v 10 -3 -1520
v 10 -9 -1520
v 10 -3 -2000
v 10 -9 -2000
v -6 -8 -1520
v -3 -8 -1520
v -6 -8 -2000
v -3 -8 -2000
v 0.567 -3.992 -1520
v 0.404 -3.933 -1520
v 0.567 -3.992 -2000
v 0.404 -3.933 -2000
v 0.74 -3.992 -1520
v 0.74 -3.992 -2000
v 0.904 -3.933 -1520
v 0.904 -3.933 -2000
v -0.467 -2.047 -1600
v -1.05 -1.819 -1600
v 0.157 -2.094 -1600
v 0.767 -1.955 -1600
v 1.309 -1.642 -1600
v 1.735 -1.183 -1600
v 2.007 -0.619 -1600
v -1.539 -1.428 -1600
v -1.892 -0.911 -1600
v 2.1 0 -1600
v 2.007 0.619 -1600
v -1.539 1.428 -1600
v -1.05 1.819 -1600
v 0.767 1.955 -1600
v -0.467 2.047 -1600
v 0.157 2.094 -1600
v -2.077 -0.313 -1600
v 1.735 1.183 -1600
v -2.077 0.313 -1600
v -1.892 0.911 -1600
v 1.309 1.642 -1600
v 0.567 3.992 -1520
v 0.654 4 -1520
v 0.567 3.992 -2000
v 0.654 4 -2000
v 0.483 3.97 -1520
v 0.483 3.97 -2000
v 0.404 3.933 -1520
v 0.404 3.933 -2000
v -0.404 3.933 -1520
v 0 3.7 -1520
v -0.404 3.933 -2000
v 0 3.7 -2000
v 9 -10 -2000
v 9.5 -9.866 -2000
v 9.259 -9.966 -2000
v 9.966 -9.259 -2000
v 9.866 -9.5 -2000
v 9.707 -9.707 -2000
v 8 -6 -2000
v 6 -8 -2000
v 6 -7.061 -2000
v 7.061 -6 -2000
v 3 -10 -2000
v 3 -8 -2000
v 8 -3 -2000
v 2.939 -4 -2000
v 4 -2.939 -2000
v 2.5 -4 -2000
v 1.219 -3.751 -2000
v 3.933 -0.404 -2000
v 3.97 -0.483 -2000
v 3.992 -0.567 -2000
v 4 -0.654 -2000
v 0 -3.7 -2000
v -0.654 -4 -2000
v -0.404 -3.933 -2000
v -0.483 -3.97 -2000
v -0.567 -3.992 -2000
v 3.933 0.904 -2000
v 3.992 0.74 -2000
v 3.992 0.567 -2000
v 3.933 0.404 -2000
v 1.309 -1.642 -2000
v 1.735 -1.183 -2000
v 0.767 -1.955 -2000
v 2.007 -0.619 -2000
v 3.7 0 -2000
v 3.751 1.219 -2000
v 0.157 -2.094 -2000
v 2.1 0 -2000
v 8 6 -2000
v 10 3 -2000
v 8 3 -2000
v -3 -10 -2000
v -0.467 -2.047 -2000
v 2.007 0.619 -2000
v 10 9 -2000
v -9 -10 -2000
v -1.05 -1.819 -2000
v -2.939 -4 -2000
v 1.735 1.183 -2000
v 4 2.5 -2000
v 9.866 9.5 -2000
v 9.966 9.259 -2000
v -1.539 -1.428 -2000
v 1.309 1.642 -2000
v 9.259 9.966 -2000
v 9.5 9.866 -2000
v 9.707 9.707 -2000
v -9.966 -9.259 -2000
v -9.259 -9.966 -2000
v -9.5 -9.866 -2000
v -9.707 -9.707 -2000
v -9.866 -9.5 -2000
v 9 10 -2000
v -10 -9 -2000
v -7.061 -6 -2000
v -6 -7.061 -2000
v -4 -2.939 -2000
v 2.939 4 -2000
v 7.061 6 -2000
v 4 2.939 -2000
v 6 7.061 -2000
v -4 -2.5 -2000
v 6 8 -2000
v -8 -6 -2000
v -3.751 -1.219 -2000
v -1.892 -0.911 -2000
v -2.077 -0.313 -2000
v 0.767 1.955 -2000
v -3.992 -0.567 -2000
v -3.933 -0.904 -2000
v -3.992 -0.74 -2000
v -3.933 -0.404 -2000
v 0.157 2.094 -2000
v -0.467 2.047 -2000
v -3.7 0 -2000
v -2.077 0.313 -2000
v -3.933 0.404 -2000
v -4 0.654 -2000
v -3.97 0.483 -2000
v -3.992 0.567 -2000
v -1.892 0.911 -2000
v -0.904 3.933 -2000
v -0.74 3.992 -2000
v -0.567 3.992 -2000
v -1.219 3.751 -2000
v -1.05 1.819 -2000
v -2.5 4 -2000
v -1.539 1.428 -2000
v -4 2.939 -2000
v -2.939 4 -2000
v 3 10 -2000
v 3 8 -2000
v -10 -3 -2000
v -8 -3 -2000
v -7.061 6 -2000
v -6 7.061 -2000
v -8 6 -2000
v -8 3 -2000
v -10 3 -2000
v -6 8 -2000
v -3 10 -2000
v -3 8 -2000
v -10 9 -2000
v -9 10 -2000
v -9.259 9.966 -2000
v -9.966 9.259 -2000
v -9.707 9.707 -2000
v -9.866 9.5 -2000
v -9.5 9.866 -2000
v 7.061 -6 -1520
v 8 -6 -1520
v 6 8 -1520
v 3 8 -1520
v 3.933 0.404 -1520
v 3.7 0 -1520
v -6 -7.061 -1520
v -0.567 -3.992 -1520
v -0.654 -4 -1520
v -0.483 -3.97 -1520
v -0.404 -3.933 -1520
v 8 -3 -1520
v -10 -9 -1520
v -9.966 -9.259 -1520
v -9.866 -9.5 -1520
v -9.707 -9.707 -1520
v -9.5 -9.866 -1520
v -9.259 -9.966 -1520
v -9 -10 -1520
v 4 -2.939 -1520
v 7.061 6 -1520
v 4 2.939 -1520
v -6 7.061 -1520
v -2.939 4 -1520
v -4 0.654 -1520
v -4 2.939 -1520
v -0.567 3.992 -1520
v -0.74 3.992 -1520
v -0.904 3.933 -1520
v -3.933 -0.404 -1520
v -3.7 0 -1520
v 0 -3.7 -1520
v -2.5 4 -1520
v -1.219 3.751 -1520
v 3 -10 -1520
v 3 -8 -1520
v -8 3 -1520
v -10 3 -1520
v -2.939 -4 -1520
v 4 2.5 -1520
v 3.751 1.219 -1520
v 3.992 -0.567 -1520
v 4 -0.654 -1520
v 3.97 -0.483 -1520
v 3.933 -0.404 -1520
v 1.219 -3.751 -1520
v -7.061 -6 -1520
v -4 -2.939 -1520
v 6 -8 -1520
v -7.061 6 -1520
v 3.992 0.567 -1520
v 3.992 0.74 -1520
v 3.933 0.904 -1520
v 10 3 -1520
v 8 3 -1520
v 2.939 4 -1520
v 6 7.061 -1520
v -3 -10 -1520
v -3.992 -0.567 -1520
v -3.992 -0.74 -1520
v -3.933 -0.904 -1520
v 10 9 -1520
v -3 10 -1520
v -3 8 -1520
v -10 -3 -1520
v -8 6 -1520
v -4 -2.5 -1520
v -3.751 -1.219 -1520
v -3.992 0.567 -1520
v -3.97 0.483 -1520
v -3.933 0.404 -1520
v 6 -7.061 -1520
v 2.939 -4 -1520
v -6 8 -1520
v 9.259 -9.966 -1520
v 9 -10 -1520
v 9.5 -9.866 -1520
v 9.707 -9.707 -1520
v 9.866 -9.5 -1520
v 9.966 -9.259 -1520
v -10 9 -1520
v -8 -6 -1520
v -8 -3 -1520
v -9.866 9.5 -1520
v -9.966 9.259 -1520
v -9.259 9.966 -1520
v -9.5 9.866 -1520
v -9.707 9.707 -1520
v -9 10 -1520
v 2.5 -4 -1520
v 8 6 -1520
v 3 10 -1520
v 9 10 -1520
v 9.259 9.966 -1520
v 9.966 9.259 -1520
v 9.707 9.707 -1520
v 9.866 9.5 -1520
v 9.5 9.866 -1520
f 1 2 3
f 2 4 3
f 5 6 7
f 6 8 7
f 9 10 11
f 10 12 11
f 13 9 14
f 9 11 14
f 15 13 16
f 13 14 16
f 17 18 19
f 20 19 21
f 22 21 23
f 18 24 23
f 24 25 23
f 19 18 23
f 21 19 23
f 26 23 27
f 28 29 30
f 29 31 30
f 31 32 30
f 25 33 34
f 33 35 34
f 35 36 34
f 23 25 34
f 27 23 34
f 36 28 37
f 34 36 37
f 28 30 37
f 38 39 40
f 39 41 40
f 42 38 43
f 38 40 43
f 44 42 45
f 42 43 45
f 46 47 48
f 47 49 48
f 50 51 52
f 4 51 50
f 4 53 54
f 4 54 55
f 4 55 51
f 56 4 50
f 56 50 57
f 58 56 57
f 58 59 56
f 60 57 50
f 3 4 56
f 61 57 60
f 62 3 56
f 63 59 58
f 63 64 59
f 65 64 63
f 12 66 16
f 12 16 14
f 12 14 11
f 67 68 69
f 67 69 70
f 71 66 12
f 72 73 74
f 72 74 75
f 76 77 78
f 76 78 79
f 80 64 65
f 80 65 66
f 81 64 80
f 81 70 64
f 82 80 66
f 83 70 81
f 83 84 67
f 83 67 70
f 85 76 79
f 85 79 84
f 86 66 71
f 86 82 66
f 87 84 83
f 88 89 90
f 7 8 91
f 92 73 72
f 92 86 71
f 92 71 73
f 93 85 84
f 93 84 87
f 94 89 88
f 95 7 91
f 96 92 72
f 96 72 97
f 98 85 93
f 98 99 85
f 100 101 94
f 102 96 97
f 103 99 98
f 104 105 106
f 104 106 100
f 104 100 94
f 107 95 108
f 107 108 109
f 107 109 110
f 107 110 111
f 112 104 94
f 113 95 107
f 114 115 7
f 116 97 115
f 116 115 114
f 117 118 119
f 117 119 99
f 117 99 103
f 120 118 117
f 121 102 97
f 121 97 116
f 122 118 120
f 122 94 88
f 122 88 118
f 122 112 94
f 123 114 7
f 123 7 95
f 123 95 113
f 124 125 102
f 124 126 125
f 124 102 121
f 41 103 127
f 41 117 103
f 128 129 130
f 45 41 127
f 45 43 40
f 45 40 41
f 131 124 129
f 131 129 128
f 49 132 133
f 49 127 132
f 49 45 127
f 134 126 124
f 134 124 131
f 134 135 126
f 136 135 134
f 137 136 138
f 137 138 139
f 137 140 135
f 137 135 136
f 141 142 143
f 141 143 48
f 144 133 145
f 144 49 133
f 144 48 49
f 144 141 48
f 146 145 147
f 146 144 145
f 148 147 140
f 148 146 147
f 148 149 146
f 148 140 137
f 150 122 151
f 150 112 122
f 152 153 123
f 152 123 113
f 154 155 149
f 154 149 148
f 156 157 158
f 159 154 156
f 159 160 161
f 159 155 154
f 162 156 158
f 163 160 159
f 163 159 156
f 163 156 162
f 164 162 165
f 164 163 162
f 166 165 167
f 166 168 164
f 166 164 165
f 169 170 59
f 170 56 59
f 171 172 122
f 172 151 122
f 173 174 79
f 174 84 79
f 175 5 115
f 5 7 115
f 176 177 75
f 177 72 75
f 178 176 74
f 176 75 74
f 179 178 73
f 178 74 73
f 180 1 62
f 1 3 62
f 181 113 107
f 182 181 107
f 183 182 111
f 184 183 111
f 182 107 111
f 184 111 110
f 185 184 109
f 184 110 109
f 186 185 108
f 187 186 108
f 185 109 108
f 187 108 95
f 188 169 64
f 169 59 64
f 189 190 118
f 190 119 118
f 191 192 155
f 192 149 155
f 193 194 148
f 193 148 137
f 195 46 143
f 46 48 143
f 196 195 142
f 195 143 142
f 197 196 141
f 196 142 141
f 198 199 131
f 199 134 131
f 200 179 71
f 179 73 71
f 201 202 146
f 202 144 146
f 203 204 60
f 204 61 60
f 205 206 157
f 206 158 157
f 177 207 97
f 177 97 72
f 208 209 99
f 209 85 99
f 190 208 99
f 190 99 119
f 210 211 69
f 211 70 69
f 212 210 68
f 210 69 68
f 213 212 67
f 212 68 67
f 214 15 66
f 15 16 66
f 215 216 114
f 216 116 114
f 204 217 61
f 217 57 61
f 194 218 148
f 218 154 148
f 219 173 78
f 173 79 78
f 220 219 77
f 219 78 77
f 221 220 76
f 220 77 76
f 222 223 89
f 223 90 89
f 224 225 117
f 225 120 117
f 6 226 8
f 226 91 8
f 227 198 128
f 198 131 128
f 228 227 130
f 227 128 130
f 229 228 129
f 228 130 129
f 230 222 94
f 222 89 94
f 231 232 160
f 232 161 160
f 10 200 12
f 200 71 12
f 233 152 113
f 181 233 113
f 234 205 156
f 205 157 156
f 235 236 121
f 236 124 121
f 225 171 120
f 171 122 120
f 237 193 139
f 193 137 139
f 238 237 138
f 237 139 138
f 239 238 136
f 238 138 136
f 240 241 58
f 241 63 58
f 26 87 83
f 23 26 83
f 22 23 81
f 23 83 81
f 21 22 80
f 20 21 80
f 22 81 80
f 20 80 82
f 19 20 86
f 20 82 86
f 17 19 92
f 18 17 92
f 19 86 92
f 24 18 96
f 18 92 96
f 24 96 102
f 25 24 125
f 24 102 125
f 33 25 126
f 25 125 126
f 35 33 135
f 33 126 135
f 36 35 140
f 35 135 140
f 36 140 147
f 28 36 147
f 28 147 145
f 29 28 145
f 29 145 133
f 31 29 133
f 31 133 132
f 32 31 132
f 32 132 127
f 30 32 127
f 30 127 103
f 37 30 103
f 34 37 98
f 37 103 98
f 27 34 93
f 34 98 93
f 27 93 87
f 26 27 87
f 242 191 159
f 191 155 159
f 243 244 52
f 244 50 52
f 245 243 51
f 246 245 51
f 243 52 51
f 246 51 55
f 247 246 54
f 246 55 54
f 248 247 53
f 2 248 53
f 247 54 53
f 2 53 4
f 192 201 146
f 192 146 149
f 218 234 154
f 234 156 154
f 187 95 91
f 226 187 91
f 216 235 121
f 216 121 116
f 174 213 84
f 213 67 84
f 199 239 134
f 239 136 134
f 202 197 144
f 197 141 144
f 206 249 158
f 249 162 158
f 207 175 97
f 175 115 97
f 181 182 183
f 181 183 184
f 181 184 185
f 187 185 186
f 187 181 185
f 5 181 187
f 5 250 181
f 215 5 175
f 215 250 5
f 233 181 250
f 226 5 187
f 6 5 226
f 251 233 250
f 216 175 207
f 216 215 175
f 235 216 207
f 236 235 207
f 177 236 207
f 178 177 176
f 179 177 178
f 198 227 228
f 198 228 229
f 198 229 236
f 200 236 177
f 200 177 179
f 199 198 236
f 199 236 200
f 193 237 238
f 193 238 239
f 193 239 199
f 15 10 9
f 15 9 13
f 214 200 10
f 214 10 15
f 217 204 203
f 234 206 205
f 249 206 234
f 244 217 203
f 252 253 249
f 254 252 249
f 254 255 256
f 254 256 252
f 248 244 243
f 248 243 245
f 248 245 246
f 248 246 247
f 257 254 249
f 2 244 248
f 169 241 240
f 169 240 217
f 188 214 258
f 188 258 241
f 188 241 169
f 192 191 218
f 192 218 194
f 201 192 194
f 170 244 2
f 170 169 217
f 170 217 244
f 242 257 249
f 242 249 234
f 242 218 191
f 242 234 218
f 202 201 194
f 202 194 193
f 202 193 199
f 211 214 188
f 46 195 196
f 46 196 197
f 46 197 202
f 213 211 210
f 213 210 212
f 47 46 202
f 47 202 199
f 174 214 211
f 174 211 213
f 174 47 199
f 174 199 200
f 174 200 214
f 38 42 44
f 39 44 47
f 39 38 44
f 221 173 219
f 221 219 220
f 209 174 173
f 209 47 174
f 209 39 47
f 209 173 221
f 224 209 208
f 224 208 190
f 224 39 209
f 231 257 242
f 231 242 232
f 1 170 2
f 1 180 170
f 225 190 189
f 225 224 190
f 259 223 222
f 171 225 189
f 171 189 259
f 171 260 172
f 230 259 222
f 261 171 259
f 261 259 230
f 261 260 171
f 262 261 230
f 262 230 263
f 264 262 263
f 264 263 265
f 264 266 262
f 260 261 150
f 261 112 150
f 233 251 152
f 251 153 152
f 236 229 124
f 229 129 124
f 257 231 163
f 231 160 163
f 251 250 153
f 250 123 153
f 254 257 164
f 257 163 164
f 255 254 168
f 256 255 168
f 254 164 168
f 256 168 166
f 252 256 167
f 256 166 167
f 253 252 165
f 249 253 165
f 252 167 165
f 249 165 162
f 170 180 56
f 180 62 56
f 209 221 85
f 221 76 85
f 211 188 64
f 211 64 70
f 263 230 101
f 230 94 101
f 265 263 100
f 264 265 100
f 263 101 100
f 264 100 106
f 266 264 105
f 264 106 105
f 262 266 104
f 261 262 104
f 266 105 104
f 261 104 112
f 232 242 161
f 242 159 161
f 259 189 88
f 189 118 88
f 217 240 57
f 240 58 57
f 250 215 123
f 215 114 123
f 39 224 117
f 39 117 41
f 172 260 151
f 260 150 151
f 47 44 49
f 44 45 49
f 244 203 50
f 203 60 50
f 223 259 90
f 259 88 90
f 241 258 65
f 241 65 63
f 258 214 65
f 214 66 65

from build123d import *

# Parameters (mm, degrees)
SKETCH1_R           = 2.1
BOSS_EXTRUDE1_DEPTH = 400
EXTRUDE_1_DEPTH     = 20
EXTRUDE_2_DEPTH     = 60


with BuildPart() as part:
    # Sketch1 → Boss-Extrude1 (new body)
    with BuildSketch(Plane(origin=(0, 0, -2000), x_dir=(-1, 0, 0), z_dir=(0, 0, -1))):
        with BuildLine():
            Line((10, -3), (8, -3))
            Line((8, -3), (8, -6))
            Line((8, -6), (7.060660172, -6))
            Line((7.060660172, -6), (4, -2.939339828))
            Line((4, -2.939339828), (4, -2.5))
            Line((4, -2.5), (3.750976592, -1.218885629))
            Line((3.750976592, -1.218885629), (3.933012702, -0.903589838))
            ThreePointArc((3.933012702, -0.903589838), (4, -0.653589838), (3.933012702, -0.403589838))
            Line((3.933012702, -0.403589838), (3.7, 0))
            Line((3.7, 0), (3.933012702, 0.403589838))
            ThreePointArc((3.933012702, 0.403589838), (3.982962913, 0.524180316), (4, 0.653589838))
            Line((4, 0.653589838), (4, 2.939339828))
            Line((4, 2.939339828), (7.060660172, 6))
            Line((7.060660172, 6), (8, 6))
            Line((8, 6), (8, 3))
            Line((8, 3), (10, 3))
            Line((10, 3), (10, 9))
            ThreePointArc((10, 9), (9.707106781, 9.707106781), (9, 10))
            Line((9, 10), (3, 10))
            Line((3, 10), (3, 8))
            Line((3, 8), (6, 8))
            Line((6, 8), (6, 7.060660172))
            Line((6, 7.060660172), (2.939339828, 4))
            Line((2.939339828, 4), (2.5, 4))
            Line((2.5, 4), (1.218885629, 3.750976592))
            Line((1.218885629, 3.750976592), (0.903589838, 3.933012702))
            ThreePointArc((0.903589838, 3.933012702), (0.653589838, 4), (0.403589838, 3.933012702))
            Line((0.403589838, 3.933012702), (0, 3.7))
            Line((0, 3.7), (-0.403589838, 3.933012702))
            ThreePointArc((-0.403589838, 3.933012702), (-0.524180316, 3.982962913), (-0.653589838, 4))
            Line((-0.653589838, 4), (-2.939339828, 4))
            Line((-2.939339828, 4), (-6, 7.060660172))
            Line((-6, 7.060660172), (-6, 8))
            Line((-6, 8), (-3, 8))
            Line((-3, 8), (-3, 10))
            Line((-3, 10), (-9, 10))
            ThreePointArc((-9, 10), (-9.707106781, 9.707106781), (-10, 9))
            Line((-10, 9), (-10, 3))
            Line((-10, 3), (-8, 3))
            Line((-8, 3), (-8, 6))
            Line((-8, 6), (-7.060660172, 6))
            Line((-7.060660172, 6), (-4, 2.939339828))
            Line((-4, 2.939339828), (-4, 2.5))
            Line((-4, 2.5), (-3.750976592, 1.218885629))
            Line((-3.750976592, 1.218885629), (-3.933012702, 0.903589838))
            ThreePointArc((-3.933012702, 0.903589838), (-4, 0.653589838), (-3.933012702, 0.403589838))
            Line((-3.933012702, 0.403589838), (-3.7, 0))
            Line((-3.7, 0), (-3.933012702, -0.403589838))
            ThreePointArc((-3.933012702, -0.403589838), (-3.982962913, -0.524180316), (-4, -0.653589838))
            Line((-4, -0.653589838), (-4, -2.939339828))
            Line((-4, -2.939339828), (-7.060660172, -6))
            Line((-7.060660172, -6), (-8, -6))
            Line((-8, -6), (-8, -3))
            Line((-8, -3), (-10, -3))
            Line((-10, -3), (-10, -9))
            ThreePointArc((-10, -9), (-9.707106781, -9.707106781), (-9, -10))
            Line((-9, -10), (-3, -10))
            Line((-3, -10), (-3, -8))
            Line((-3, -8), (-6, -8))
            Line((-6, -8), (-6, -7.060660172))
            Line((-6, -7.060660172), (-2.939339828, -4))
            Line((-2.939339828, -4), (-2.5, -4))
            Line((-2.5, -4), (-1.218885629, -3.750976592))
            Line((-1.218885629, -3.750976592), (-0.903589838, -3.933012702))
            ThreePointArc((-0.903589838, -3.933012702), (-0.653589838, -4), (-0.403589838, -3.933012702))
            Line((-0.403589838, -3.933012702), (0, -3.7))
            Line((0, -3.7), (0.403589838, -3.933012702))
            ThreePointArc((0.403589838, -3.933012702), (0.524180316, -3.982962913), (0.653589838, -4))
            Line((0.653589838, -4), (2.939339828, -4))
            Line((2.939339828, -4), (6, -7.060660172))
            Line((6, -7.060660172), (6, -8))
            Line((6, -8), (3, -8))
            Line((3, -8), (3, -10))
            Line((3, -10), (9, -10))
            ThreePointArc((9, -10), (9.707106781, -9.707106781), (10, -9))
            Line((10, -9), (10, -3))
        make_face()
        with Locations(Location((0, 0, 0), (0, 0, 180))):
            Circle(SKETCH1_R, mode=Mode.SUBTRACT)
    extrude(amount=-BOSS_EXTRUDE1_DEPTH)

    # 草图1 → 凸台-拉伸1 (add)
    with BuildSketch(Plane.XY.offset(-1600)):
        with BuildLine():
            Line((-10, -3), (-10, -9))
            ThreePointArc((-10, -9), (-9.707106781, -9.707106781), (-9, -10))
            Line((-9, -10), (-3, -10))
            Line((-3, -10), (-3, -8))
            Line((-3, -8), (-6, -8))
            Line((-6, -8), (-6, -7.060660172))
            Line((-6, -7.060660172), (-2.939339828, -4))
            Line((-2.939339828, -4), (-0.653589838, -4))
            ThreePointArc((-0.653589838, -4), (-0.524180316, -3.982962913), (-0.403589838, -3.933012702))
            Line((-0.403589838, -3.933012702), (0, -3.7))
            Line((0, -3.7), (0.403589838, -3.933012702))
            ThreePointArc((0.403589838, -3.933012702), (0.653589838, -4), (0.903589838, -3.933012702))
            Line((0.903589838, -3.933012702), (1.218885629, -3.750976592))
            Line((1.218885629, -3.750976592), (2.5, -4))
            Line((2.5, -4), (2.939339828, -4))
            Line((2.939339828, -4), (6, -7.060660172))
            Line((6, -7.060660172), (6, -8))
            Line((6, -8), (3, -8))
            Line((3, -8), (3, -10))
            Line((3, -10), (9, -10))
            ThreePointArc((9, -10), (9.707106781, -9.707106781), (10, -9))
            Line((10, -9), (10, -3))
            Line((10, -3), (8, -3))
            Line((8, -3), (8, -6))
            Line((8, -6), (7.060660172, -6))
            Line((7.060660172, -6), (4, -2.939339828))
            Line((4, -2.939339828), (4, -0.653589838))
            ThreePointArc((4, -0.653589838), (3.982962913, -0.524180316), (3.933012702, -0.403589838))
            Line((3.933012702, -0.403589838), (3.7, 0))
            Line((3.7, 0), (3.933012702, 0.403589838))
            ThreePointArc((3.933012702, 0.403589838), (4, 0.653589838), (3.933012702, 0.903589838))
            Line((3.933012702, 0.903589838), (3.750976592, 1.218885629))
            Line((3.750976592, 1.218885629), (4, 2.5))
            Line((4, 2.5), (4, 2.939339828))
            Line((4, 2.939339828), (7.060660172, 6))
            Line((7.060660172, 6), (8, 6))
            Line((8, 6), (8, 3))
            Line((8, 3), (10, 3))
            Line((10, 3), (10, 9))
            ThreePointArc((10, 9), (9.707106781, 9.707106781), (9, 10))
            Line((9, 10), (3, 10))
            Line((3, 10), (3, 8))
            Line((3, 8), (6, 8))
            Line((6, 8), (6, 7.060660172))
            Line((6, 7.060660172), (2.939339828, 4))
            Line((2.939339828, 4), (0.653589838, 4))
            ThreePointArc((0.653589838, 4), (0.524180316, 3.982962913), (0.403589838, 3.933012702))
            Line((0.403589838, 3.933012702), (0, 3.7))
            Line((0, 3.7), (-0.403589838, 3.933012702))
            ThreePointArc((-0.403589838, 3.933012702), (-0.653589838, 4), (-0.903589838, 3.933012702))
            Line((-0.903589838, 3.933012702), (-1.218885629, 3.750976592))
            Line((-1.218885629, 3.750976592), (-2.5, 4))
            Line((-2.5, 4), (-2.939339828, 4))
            Line((-2.939339828, 4), (-6, 7.060660172))
            Line((-6, 7.060660172), (-6, 8))
            Line((-6, 8), (-3, 8))
            Line((-3, 8), (-3, 10))
            Line((-3, 10), (-9, 10))
            ThreePointArc((-9, 10), (-9.707106781, 9.707106781), (-10, 9))
            Line((-10, 9), (-10, 3))
            Line((-10, 3), (-8, 3))
            Line((-8, 3), (-8, 6))
            Line((-8, 6), (-7.060660172, 6))
            Line((-7.060660172, 6), (-4, 2.939339828))
            Line((-4, 2.939339828), (-4, 0.653589838))
            ThreePointArc((-4, 0.653589838), (-3.982962913, 0.524180316), (-3.933012702, 0.403589838))
            Line((-3.933012702, 0.403589838), (-3.7, 0))
            Line((-3.7, 0), (-3.933012702, -0.403589838))
            ThreePointArc((-3.933012702, -0.403589838), (-4, -0.653589838), (-3.933012702, -0.903589838))
            Line((-3.933012702, -0.903589838), (-3.750976592, -1.218885629))
            Line((-3.750976592, -1.218885629), (-4, -2.5))
            Line((-4, -2.5), (-4, -2.939339828))
            Line((-4, -2.939339828), (-7.060660172, -6))
            Line((-7.060660172, -6), (-8, -6))
            Line((-8, -6), (-8, -3))
            Line((-8, -3), (-10, -3))
        make_face()
    extrude(amount=EXTRUDE_1_DEPTH)

    # 草图2 → 凸台-拉伸2 (add)
    with BuildSketch(Plane.XY.offset(-1580)):
        with BuildLine():
            Line((-9, -10), (-3, -10))
            Line((-3, -10), (-3, -8))
            Line((-3, -8), (-6, -8))
            Line((-6, -8), (-6, -7.060660172))
            Line((-6, -7.060660172), (-2.939339828, -4))
            Line((-2.939339828, -4), (-0.653589838, -4))
            ThreePointArc((-0.653589838, -4), (-0.524180316, -3.982962913), (-0.403589838, -3.933012702))
            Line((-0.403589838, -3.933012702), (0, -3.7))
            Line((0, -3.7), (0.403589838, -3.933012702))
            ThreePointArc((0.403589838, -3.933012702), (0.653589838, -4), (0.903589838, -3.933012702))
            Line((0.903589838, -3.933012702), (1.218885629, -3.750976592))
            Line((1.218885629, -3.750976592), (2.5, -4))
            Line((2.5, -4), (2.939339828, -4))
            Line((2.939339828, -4), (6, -7.060660172))
            Line((6, -7.060660172), (6, -8))
            Line((6, -8), (3, -8))
            Line((3, -8), (3, -10))
            Line((3, -10), (9, -10))
            ThreePointArc((9, -10), (9.707106781, -9.707106781), (10, -9))
            Line((10, -9), (10, -3))
            Line((10, -3), (8, -3))
            Line((8, -3), (8, -6))
            Line((8, -6), (7.060660172, -6))
            Line((7.060660172, -6), (4, -2.939339828))
            Line((4, -2.939339828), (4, -0.653589838))
            ThreePointArc((4, -0.653589838), (3.982962913, -0.524180316), (3.933012702, -0.403589838))
            Line((3.933012702, -0.403589838), (3.7, 0))
            Line((3.7, 0), (3.933012702, 0.403589838))
            ThreePointArc((3.933012702, 0.403589838), (4, 0.653589838), (3.933012702, 0.903589838))
            Line((3.933012702, 0.903589838), (3.750976592, 1.218885629))
            Line((3.750976592, 1.218885629), (4, 2.5))
            Line((4, 2.5), (4, 2.939339828))
            Line((4, 2.939339828), (7.060660172, 6))
            Line((7.060660172, 6), (8, 6))
            Line((8, 6), (8, 3))
            Line((8, 3), (10, 3))
            Line((10, 3), (10, 9))
            ThreePointArc((10, 9), (9.707106781, 9.707106781), (9, 10))
            Line((9, 10), (3, 10))
            Line((3, 10), (3, 8))
            Line((3, 8), (6, 8))
            Line((6, 8), (6, 7.060660172))
            Line((6, 7.060660172), (2.939339828, 4))
            Line((2.939339828, 4), (0.653589838, 4))
            ThreePointArc((0.653589838, 4), (0.524180316, 3.982962913), (0.403589838, 3.933012702))
            Line((0.403589838, 3.933012702), (0, 3.7))
            Line((0, 3.7), (-0.403589838, 3.933012702))
            ThreePointArc((-0.403589838, 3.933012702), (-0.653589838, 4), (-0.903589838, 3.933012702))
            Line((-0.903589838, 3.933012702), (-1.218885629, 3.750976592))
            Line((-1.218885629, 3.750976592), (-2.5, 4))
            Line((-2.5, 4), (-2.939339828, 4))
            Line((-2.939339828, 4), (-6, 7.060660172))
            Line((-6, 7.060660172), (-6, 8))
            Line((-6, 8), (-3, 8))
            Line((-3, 8), (-3, 10))
            Line((-3, 10), (-9, 10))
            ThreePointArc((-9, 10), (-9.707106781, 9.707106781), (-10, 9))
            Line((-10, 9), (-10, 3))
            Line((-10, 3), (-8, 3))
            Line((-8, 3), (-8, 6))
            Line((-8, 6), (-7.060660172, 6))
            Line((-7.060660172, 6), (-4, 2.939339828))
            Line((-4, 2.939339828), (-4, 0.653589838))
            ThreePointArc((-4, 0.653589838), (-3.982962913, 0.524180316), (-3.933012702, 0.403589838))
            Line((-3.933012702, 0.403589838), (-3.7, 0))
            Line((-3.7, 0), (-3.933012702, -0.403589838))
            ThreePointArc((-3.933012702, -0.403589838), (-4, -0.653589838), (-3.933012702, -0.903589838))
            Line((-3.933012702, -0.903589838), (-3.750976592, -1.218885629))
            Line((-3.750976592, -1.218885629), (-4, -2.5))
            Line((-4, -2.5), (-4, -2.939339828))
            Line((-4, -2.939339828), (-7.060660172, -6))
            Line((-7.060660172, -6), (-8, -6))
            Line((-8, -6), (-8, -3))
            Line((-8, -3), (-10, -3))
            Line((-10, -3), (-10, -9))
            ThreePointArc((-10, -9), (-9.707106781, -9.707106781), (-9, -10))
        make_face()
    extrude(amount=EXTRUDE_2_DEPTH)


solid = part.part
